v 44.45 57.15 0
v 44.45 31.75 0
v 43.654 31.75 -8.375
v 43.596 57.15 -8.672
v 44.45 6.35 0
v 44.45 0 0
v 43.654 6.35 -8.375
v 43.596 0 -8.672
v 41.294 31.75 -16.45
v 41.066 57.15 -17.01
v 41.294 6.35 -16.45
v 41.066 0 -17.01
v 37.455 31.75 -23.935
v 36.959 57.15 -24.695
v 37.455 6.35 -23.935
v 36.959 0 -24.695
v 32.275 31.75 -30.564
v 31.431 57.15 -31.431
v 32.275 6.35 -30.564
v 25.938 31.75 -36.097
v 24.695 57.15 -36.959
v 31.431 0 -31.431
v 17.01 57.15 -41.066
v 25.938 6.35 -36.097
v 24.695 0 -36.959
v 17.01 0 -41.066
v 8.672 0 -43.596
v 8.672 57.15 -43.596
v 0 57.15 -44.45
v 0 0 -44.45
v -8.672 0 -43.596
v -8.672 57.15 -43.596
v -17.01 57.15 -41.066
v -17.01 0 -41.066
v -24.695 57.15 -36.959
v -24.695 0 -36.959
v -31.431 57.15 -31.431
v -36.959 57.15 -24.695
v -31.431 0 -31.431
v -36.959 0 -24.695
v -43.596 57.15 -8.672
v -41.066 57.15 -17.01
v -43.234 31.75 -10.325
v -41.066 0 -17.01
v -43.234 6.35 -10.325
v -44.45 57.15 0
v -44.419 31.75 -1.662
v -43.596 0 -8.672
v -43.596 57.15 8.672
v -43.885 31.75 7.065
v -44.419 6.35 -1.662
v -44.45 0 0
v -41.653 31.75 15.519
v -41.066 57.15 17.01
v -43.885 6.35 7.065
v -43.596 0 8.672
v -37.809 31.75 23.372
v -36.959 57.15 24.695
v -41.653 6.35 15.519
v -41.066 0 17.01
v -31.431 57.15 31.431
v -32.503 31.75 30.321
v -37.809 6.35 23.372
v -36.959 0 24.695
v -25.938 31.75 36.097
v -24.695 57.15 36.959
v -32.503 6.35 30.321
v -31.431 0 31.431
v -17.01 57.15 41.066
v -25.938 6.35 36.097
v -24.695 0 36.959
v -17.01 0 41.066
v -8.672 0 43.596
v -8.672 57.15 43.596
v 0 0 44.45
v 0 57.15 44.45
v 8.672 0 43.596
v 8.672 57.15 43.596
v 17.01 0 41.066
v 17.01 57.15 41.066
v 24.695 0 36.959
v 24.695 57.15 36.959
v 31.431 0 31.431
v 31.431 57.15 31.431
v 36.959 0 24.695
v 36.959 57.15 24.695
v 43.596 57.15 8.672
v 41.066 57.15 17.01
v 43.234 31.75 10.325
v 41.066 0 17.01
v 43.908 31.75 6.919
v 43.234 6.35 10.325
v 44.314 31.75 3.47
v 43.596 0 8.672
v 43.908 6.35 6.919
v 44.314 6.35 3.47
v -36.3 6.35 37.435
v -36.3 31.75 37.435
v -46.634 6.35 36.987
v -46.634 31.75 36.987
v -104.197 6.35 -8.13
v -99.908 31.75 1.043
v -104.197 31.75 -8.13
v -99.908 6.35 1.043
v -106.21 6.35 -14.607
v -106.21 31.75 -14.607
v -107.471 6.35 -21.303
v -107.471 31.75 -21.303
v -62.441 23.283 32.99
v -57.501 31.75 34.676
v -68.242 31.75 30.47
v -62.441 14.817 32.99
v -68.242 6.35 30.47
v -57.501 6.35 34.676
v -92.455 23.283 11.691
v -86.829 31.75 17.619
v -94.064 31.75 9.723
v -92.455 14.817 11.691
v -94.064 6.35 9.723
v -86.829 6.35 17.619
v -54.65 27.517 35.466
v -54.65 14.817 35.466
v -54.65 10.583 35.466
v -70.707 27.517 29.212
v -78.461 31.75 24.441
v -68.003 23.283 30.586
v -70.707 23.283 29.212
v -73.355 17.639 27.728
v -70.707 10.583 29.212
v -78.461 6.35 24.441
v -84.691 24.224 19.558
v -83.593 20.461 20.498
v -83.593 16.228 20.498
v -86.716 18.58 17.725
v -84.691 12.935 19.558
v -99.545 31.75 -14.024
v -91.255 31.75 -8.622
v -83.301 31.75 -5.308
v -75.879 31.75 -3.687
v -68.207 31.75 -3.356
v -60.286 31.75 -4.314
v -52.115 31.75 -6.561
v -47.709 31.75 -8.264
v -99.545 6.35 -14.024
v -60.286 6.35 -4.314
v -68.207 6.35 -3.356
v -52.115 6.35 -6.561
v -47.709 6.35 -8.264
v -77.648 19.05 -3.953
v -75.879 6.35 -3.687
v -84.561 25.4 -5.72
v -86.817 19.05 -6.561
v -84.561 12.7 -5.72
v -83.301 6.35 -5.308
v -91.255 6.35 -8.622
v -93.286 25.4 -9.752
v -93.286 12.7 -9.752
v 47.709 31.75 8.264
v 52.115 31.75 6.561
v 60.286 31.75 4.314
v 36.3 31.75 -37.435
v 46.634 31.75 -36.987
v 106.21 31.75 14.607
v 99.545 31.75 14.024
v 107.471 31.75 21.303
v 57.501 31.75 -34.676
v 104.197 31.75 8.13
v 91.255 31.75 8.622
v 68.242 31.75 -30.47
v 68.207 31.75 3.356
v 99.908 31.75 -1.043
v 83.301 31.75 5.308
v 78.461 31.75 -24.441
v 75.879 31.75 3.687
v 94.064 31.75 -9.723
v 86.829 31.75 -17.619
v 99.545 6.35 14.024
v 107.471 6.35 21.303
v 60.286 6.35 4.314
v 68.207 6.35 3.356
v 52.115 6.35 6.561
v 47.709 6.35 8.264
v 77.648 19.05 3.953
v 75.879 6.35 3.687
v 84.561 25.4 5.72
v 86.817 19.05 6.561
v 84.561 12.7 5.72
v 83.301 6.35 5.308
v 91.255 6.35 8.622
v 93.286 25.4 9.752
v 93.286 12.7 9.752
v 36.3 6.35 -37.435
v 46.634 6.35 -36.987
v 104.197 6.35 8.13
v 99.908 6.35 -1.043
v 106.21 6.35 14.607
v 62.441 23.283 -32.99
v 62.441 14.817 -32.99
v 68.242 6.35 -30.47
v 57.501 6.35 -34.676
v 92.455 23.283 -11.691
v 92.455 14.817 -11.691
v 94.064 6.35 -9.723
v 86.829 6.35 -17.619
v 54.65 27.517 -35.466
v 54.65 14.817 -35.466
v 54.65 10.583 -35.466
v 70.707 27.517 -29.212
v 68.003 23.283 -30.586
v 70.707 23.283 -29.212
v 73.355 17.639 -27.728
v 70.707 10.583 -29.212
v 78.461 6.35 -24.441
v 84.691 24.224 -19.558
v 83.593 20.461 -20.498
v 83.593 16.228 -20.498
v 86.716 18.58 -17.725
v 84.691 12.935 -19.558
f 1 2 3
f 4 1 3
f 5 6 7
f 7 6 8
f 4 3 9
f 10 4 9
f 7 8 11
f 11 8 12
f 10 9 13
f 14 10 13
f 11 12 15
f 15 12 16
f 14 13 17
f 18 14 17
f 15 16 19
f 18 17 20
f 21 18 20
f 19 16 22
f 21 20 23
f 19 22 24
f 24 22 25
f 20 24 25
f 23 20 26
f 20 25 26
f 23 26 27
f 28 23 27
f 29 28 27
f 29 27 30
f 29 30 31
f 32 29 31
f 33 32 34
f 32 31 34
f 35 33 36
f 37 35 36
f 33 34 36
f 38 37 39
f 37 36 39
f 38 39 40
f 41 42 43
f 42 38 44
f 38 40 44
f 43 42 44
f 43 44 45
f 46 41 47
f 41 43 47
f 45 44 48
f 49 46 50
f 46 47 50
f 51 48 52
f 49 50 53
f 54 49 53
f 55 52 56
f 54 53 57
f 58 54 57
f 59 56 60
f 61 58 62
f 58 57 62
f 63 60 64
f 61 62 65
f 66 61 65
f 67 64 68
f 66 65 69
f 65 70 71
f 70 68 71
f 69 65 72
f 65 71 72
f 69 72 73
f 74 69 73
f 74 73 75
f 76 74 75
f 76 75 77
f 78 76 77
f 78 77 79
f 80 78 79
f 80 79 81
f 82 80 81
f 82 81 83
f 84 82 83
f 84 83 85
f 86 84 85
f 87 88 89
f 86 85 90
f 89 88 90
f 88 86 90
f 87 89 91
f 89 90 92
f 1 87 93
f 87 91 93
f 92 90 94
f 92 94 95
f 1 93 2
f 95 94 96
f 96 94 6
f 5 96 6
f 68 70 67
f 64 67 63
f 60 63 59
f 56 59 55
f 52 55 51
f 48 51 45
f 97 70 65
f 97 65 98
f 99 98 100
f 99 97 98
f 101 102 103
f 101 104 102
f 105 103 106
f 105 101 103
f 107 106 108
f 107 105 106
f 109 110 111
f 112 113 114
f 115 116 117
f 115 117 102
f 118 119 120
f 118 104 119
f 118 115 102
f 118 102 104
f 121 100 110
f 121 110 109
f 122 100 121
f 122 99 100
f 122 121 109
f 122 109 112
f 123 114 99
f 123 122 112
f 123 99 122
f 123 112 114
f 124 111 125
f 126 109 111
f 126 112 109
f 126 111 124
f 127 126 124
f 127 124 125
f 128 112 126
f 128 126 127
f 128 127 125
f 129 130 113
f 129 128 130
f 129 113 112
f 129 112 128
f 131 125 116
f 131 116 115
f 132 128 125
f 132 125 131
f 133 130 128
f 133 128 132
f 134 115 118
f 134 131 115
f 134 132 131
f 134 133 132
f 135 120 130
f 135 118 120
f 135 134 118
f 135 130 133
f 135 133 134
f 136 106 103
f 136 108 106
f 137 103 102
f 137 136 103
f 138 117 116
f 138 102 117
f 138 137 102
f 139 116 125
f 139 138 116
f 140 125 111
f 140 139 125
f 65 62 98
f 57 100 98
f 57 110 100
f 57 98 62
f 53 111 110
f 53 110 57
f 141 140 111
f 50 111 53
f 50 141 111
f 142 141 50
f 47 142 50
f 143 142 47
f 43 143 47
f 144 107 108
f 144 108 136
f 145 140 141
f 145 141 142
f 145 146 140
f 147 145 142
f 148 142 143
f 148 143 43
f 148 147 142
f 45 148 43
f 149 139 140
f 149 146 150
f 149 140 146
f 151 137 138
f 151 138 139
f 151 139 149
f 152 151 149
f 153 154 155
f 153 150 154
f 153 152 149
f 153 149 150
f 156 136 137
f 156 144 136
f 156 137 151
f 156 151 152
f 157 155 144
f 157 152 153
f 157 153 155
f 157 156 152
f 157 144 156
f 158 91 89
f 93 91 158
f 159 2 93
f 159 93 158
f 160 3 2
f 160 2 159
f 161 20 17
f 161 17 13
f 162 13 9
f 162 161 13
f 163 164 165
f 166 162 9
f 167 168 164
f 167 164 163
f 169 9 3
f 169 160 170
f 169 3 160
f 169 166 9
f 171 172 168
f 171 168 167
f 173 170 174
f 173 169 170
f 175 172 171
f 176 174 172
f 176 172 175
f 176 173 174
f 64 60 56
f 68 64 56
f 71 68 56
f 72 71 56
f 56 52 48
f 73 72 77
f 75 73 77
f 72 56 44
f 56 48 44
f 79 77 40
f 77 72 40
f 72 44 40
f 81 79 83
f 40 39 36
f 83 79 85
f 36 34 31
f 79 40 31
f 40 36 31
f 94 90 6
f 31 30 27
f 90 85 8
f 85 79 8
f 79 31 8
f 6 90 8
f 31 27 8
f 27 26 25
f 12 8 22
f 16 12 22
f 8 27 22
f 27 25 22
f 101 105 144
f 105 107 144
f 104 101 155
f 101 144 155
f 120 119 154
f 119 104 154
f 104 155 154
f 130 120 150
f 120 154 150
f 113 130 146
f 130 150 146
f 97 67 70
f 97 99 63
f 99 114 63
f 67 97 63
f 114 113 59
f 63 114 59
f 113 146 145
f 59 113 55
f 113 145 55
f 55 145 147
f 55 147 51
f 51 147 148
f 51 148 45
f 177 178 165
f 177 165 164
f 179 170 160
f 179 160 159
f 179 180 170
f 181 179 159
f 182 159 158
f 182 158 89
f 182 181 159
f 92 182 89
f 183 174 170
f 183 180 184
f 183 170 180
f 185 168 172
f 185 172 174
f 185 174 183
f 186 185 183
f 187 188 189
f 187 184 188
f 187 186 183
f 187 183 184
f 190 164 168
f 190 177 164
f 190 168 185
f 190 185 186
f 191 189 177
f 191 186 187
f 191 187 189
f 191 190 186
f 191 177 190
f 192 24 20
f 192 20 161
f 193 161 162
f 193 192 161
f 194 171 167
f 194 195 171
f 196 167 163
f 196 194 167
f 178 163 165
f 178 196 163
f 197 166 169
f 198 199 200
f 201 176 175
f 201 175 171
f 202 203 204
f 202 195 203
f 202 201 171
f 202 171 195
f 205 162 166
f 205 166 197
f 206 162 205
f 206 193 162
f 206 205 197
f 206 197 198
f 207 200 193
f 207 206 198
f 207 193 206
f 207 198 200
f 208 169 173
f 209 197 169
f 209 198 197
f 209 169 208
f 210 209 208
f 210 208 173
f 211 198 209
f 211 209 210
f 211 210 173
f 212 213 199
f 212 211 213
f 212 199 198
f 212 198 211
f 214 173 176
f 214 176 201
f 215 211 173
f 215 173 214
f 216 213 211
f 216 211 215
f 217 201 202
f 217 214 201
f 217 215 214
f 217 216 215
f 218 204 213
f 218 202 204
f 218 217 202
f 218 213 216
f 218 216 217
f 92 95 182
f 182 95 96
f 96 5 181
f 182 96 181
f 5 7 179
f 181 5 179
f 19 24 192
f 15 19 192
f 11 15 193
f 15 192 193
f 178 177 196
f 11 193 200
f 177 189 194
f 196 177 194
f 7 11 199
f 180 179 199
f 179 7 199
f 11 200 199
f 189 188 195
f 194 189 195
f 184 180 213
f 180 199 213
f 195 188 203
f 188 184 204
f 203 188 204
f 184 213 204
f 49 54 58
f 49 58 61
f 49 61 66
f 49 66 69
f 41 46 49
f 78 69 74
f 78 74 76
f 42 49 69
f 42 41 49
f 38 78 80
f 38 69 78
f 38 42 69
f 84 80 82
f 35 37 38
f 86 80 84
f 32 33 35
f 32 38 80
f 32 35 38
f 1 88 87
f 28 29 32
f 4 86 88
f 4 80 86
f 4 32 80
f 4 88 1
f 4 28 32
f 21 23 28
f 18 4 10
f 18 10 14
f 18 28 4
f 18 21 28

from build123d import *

# Parameters (mm, degrees)
SKETCH1_R           = 44.45
BOSS_EXTRUDE1_DEPTH = 57.15
BOSS_EXTRUDE2_DEPTH = 25.4


with BuildPart() as part:
    # Sketch1 → Boss-Extrude1 (new body)
    with BuildSketch(Plane(origin=(0, 0, 0), x_dir=(1, 0, 0), z_dir=(0, 1, 0))):
        Circle(SKETCH1_R)
    extrude(amount=BOSS_EXTRUDE1_DEPTH)

    # Sketch3 → Boss-Extrude2 (add)
    with BuildSketch(Plane(origin=(0, 6.35, 0), x_dir=(1, 0, 0), z_dir=(0, 1, 0))):
        with BuildLine():
            ThreePointArc((25.93836289, 36.097144355), (41.652954947, 15.518822255), (43.234152204, -10.325240105))
            add(Edge.make_bspline(
                [(107.47145922, -21.303368675), (79.942418966, 7.909262822), (43.234152204, -10.325240105)],
                knots=[0, 0, 0, 1, 1, 1], degree=2))
            add(Edge.make_bspline(
                [(25.93836289, 36.097144355), (62.849269779, 44.250068413), (102.789157255, 15.374374685), (107.47145922, -21.303368675)],
                knots=[0, 0, 0, 0, 1, 1, 1, 1], degree=3))
        make_face()
        with BuildLine():
            ThreePointArc((-25.93836289, -36.097144355), (-41.652954947, -15.518822255), (-43.234152204, 10.325240105))
            add(Edge.make_bspline(
                [(-107.47145922, 21.303368675), (-79.942418966, -7.909262822), (-43.234152204, 10.325240105)],
                knots=[0, 0, 0, 1, 1, 1], degree=2))
            add(Edge.make_bspline(
                [(-25.93836289, -36.097144355), (-62.849269779, -44.250068413), (-102.789157255, -15.374374685), (-107.47145922, 21.303368675)],
                knots=[0, 0, 0, 0, 1, 1, 1, 1], degree=3))
        make_face()
    extrude(amount=BOSS_EXTRUDE2_DEPTH)


solid = part.part
